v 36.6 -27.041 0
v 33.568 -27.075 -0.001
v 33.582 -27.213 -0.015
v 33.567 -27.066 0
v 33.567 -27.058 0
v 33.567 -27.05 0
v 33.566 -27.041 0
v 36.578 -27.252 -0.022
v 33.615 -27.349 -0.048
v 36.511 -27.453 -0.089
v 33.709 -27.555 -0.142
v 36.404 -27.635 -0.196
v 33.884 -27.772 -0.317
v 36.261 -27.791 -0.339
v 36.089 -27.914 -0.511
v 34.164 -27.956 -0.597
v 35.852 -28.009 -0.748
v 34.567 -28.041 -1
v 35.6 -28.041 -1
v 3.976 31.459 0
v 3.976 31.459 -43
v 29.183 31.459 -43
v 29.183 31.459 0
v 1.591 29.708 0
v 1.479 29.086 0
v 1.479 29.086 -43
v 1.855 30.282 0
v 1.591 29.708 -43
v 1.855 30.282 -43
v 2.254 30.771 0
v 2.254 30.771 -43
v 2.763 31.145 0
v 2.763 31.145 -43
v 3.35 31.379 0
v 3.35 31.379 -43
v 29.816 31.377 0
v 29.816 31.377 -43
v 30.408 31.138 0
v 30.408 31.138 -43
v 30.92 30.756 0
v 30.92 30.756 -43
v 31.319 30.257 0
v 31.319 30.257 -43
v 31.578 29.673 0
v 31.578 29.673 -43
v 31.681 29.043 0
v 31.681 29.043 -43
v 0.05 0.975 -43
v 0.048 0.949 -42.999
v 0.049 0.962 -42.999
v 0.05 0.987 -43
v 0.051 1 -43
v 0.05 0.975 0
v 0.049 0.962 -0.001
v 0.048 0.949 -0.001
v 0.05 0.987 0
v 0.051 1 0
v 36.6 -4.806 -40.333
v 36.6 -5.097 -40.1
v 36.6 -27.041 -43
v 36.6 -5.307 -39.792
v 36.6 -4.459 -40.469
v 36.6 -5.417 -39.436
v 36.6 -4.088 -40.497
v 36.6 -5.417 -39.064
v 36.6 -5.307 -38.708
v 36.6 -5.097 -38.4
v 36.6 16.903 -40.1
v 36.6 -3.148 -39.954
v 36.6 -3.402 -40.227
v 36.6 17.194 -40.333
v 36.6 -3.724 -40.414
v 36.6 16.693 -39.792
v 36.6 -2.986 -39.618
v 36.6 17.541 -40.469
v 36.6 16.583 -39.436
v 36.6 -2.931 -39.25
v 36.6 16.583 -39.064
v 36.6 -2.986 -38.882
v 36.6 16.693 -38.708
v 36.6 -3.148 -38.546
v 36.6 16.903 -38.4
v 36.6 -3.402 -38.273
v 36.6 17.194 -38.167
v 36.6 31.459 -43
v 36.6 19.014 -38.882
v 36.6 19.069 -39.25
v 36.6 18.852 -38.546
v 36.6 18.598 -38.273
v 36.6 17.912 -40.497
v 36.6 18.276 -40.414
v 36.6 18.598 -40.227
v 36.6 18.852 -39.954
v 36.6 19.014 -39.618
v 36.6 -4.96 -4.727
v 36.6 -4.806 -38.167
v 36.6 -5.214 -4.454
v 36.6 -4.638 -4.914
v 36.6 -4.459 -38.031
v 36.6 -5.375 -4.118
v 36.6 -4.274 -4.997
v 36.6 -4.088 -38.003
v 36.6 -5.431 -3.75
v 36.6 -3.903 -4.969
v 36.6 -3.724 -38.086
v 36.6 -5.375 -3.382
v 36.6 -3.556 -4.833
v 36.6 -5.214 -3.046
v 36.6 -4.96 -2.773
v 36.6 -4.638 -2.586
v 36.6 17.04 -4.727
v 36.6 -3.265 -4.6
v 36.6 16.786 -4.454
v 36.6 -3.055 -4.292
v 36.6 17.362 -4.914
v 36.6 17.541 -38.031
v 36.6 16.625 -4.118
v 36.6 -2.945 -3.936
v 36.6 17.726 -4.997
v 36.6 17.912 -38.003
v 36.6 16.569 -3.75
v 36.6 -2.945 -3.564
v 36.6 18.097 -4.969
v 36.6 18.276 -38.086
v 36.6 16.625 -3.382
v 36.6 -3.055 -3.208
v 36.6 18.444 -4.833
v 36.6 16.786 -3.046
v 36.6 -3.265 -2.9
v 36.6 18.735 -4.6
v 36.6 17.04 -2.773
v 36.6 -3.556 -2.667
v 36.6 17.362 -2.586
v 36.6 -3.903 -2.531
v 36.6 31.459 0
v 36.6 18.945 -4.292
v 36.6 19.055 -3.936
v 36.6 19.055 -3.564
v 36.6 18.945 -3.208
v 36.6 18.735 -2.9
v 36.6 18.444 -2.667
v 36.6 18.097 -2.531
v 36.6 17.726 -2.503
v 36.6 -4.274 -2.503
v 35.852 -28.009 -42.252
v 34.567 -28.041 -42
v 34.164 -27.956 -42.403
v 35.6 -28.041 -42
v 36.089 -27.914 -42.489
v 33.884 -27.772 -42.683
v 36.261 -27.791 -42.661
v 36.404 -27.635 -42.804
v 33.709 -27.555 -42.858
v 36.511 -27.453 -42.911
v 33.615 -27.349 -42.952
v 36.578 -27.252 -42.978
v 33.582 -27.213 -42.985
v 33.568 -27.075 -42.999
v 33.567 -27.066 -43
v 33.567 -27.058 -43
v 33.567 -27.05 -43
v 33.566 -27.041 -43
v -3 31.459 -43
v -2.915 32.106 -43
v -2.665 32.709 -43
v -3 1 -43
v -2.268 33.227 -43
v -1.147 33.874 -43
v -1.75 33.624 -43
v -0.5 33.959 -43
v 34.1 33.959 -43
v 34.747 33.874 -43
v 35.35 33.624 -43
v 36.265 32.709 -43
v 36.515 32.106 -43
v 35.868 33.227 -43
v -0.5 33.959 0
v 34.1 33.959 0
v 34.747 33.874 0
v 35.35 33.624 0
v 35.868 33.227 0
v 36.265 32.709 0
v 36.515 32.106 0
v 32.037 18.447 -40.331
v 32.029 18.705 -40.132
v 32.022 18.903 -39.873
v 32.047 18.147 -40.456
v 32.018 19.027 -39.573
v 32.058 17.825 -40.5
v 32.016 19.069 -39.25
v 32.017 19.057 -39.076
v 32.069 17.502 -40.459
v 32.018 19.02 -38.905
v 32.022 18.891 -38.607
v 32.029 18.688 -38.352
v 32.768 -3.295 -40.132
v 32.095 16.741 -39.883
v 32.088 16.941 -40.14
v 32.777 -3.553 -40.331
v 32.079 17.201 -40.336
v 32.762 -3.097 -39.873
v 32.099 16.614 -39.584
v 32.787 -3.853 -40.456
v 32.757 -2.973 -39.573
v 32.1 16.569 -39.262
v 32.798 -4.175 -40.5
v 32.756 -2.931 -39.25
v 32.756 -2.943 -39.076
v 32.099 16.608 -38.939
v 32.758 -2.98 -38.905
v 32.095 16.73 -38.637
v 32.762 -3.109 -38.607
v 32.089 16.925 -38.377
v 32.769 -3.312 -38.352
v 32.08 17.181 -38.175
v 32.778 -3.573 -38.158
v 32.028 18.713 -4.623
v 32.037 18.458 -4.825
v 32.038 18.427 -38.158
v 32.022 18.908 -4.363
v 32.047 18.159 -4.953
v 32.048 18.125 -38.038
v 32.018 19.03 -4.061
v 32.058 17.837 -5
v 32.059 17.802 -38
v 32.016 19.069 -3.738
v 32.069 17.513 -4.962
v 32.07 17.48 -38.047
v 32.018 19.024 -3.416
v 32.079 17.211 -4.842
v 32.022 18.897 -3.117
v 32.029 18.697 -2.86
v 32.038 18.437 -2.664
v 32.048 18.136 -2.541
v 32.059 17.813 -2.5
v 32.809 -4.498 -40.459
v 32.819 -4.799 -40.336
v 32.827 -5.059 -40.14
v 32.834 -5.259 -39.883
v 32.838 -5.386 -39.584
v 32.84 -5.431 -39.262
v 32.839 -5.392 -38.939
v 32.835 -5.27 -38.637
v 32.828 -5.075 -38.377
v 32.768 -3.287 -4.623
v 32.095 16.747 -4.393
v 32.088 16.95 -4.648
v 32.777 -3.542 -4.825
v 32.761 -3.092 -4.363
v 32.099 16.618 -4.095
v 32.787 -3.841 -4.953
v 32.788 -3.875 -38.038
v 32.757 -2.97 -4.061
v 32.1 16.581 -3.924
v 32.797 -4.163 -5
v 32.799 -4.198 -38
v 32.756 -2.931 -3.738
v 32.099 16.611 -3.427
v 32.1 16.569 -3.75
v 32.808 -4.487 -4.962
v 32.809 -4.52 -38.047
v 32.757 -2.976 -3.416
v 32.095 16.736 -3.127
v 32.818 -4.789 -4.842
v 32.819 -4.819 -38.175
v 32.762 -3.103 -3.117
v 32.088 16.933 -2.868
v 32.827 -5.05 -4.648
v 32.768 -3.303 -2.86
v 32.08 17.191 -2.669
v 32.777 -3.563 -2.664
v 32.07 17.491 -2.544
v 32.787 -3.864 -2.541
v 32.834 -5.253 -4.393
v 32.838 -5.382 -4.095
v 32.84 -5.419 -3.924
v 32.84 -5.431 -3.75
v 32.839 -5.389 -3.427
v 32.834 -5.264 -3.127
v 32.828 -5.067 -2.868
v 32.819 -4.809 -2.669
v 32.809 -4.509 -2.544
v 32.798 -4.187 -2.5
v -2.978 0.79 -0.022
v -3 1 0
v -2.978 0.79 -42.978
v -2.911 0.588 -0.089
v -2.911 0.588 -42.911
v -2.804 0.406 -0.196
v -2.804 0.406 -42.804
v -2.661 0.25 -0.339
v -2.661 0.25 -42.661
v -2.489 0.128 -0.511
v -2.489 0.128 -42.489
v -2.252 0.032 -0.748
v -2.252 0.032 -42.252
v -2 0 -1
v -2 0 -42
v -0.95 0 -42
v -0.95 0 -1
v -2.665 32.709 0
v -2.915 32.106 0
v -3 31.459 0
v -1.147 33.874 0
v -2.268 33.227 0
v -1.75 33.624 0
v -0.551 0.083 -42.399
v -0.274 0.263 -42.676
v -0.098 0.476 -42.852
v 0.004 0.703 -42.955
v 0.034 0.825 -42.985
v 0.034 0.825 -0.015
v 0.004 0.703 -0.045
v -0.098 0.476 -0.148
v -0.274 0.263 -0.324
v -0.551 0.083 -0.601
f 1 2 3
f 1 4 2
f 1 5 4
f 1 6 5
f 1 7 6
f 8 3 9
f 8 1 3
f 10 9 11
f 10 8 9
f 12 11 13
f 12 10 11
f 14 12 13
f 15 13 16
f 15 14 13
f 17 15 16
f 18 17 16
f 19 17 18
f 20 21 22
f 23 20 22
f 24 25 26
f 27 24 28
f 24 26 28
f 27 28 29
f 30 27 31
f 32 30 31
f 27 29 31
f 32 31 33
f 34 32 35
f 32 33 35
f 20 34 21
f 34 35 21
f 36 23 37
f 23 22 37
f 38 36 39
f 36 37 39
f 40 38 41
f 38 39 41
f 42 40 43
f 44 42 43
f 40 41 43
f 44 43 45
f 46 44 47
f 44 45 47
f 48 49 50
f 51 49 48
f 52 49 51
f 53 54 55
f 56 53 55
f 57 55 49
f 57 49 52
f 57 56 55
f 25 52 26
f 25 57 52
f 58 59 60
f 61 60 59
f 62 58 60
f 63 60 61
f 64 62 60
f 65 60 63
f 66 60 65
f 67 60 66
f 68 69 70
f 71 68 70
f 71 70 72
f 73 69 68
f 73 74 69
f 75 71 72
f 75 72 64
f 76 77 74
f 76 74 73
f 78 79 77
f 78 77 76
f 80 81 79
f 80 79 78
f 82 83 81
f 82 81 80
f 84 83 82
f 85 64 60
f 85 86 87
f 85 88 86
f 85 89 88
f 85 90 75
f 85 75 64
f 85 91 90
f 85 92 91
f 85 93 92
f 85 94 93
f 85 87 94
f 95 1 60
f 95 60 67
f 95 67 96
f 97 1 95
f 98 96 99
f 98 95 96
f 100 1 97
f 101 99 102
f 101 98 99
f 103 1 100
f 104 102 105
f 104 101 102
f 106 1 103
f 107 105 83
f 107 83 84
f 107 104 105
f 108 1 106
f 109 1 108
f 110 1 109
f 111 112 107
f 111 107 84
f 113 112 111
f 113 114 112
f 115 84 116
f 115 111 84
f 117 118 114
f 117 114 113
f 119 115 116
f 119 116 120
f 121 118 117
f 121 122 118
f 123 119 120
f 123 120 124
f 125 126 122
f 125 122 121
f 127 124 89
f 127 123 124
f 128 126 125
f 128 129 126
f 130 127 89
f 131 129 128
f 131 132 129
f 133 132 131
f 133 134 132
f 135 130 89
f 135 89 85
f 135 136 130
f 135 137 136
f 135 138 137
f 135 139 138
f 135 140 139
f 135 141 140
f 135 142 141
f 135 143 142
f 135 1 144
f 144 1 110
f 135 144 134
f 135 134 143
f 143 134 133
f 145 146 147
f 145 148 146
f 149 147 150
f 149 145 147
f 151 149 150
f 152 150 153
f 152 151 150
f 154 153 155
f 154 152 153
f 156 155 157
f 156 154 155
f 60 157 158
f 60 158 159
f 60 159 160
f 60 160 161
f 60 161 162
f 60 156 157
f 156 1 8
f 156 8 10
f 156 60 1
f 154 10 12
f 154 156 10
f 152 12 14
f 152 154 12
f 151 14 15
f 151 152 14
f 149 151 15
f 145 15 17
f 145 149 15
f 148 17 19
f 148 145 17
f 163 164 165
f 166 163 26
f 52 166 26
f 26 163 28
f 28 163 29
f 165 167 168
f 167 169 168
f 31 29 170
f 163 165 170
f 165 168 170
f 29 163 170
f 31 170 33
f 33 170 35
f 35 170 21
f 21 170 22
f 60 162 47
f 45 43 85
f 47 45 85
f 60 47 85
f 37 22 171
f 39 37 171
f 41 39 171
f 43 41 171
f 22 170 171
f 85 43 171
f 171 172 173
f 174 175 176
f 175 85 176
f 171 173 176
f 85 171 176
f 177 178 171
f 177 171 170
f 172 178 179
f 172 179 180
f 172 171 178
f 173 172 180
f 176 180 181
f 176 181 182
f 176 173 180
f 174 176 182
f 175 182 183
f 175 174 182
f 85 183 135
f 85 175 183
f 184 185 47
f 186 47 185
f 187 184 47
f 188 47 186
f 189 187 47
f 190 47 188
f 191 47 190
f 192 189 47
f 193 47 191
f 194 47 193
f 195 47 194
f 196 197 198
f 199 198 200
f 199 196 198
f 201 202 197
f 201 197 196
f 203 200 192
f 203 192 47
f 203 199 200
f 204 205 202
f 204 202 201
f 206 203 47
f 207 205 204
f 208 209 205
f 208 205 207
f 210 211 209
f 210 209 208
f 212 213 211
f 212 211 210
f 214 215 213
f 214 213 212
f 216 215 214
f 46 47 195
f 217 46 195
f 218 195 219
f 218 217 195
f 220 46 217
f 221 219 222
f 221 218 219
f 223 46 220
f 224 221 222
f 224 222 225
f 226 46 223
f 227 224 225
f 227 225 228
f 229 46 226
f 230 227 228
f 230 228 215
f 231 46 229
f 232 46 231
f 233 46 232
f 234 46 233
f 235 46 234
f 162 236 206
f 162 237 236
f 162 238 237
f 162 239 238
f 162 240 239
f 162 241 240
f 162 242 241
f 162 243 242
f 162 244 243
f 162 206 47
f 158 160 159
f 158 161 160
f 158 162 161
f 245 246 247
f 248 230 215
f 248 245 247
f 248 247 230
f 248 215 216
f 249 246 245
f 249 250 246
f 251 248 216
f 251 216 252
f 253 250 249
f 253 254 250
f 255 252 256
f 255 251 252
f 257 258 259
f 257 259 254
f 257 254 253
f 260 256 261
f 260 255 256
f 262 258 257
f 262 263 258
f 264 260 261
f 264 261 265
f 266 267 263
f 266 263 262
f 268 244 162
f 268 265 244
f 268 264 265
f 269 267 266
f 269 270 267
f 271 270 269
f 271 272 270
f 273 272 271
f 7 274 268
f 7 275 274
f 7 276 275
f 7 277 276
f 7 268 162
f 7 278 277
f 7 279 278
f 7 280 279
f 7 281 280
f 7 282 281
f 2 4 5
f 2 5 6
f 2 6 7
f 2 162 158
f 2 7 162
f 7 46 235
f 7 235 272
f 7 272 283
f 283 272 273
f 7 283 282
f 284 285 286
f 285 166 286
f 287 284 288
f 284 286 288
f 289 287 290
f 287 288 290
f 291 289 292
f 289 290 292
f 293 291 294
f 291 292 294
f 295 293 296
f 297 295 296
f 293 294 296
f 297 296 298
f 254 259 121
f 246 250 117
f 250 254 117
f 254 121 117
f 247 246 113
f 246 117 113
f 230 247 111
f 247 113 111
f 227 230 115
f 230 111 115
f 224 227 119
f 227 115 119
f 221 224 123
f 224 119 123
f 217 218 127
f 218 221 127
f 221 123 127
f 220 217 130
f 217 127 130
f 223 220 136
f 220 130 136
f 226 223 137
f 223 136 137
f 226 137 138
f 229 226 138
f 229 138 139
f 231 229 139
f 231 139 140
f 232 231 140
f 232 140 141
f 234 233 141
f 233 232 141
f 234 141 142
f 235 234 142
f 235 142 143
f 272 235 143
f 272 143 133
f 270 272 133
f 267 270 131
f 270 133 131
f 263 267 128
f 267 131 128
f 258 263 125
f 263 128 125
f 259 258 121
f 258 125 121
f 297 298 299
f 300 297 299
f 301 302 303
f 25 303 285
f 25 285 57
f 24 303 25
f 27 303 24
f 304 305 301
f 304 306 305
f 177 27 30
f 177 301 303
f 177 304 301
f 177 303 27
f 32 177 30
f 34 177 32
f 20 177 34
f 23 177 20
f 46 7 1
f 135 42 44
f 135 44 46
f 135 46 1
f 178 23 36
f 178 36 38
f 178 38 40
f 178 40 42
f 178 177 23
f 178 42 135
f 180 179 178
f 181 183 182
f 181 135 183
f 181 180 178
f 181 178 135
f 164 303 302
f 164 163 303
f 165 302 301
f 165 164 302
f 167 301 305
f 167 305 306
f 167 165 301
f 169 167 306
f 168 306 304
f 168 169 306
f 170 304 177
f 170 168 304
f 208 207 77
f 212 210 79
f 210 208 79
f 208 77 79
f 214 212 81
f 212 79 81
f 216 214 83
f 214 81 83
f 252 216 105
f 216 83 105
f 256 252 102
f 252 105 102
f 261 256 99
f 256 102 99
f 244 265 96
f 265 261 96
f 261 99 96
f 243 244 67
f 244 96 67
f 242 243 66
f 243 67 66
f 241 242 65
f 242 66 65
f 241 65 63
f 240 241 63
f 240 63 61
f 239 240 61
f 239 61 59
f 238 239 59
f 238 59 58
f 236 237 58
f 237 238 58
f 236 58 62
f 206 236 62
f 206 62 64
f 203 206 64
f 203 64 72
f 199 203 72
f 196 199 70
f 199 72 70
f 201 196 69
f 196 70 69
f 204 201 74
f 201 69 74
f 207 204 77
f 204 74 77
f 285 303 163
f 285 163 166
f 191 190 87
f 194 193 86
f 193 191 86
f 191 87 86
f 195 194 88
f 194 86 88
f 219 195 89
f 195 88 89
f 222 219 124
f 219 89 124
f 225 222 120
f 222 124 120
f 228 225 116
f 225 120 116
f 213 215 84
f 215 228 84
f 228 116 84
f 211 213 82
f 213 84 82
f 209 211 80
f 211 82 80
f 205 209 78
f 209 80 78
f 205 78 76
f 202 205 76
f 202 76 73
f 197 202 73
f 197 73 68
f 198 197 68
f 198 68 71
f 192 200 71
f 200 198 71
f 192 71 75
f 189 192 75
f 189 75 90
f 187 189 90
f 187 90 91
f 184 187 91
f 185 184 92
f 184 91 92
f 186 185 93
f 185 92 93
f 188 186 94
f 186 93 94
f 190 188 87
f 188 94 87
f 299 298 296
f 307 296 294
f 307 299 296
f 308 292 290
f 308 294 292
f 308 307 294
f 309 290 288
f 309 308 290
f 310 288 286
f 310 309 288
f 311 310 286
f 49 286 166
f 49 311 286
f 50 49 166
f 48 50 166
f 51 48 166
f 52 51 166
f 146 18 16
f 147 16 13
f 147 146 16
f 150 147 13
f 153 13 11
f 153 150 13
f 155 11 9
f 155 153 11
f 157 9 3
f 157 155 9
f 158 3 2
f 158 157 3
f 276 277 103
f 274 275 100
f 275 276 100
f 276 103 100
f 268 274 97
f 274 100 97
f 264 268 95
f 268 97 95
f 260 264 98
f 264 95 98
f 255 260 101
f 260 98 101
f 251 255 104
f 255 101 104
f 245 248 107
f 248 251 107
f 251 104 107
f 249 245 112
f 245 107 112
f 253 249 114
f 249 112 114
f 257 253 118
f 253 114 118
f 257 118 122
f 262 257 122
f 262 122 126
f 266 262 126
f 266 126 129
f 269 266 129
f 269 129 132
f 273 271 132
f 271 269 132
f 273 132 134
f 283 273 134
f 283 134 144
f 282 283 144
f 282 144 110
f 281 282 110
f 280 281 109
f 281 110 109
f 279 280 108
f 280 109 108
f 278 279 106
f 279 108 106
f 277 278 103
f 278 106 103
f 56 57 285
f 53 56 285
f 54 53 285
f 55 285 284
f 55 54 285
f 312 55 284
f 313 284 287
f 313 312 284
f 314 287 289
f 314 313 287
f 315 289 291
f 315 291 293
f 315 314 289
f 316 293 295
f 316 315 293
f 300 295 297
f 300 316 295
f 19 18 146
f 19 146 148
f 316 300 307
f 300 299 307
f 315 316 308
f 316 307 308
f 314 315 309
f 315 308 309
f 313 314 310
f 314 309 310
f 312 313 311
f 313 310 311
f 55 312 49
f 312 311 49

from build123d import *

# Parameters (mm, degrees)
BOSS_EXTRUDE1_DEPTH = 43
CUT_EXTRUDE1_REACH  = 69.604
SKETCH2_R           = 1.25
FILLET1_R           = 2.5
FILLET2_R           = 2.5
FILLET3_R           = 1
FILLET4_R           = 1


with BuildPart() as part:
    # Sketch1 → Boss-Extrude1 (new body)
    with BuildSketch(Plane.XY):
        Polygon((0, 0), (1.6, 31.458886043), (31.6, 31.458886043), (33.6, -28.041113957), (36.6, -28.041113957), (36.6, 33.958886043), (-3, 33.958886043), (-3, 0), align=None)
    extrude(amount=-BOSS_EXTRUDE1_DEPTH)

    # Cut-Extrude1: up to this plane
    cut_extrude1_end = Plane(origin=(31.6, 31.458886043, -43), z_dir=(-0.9994355464166094, -0.03359447214845748, 0))
    # Sketch2 → Cut-Extrude1 (cut, up to the surface)
    with BuildSketch(Plane(origin=(36.6, 0, 0), x_dir=(0, 0, -1), z_dir=(1, 0, 0)), mode=Mode.PRIVATE) as cut_extrude1_sk1:
        with Locations(Location((39.25, 17.819052722, 0), (0, 0, 90))):
            Circle(SKETCH2_R)
    cut_extrude1_tool1 = split(extrude(cut_extrude1_sk1.sketch, amount=-CUT_EXTRUDE1_REACH, mode=Mode.PRIVATE), bisect_by=cut_extrude1_end, keep=Keep.BOTH, mode=Mode.PRIVATE)
    add(cut_extrude1_tool1.solids().sort_by_distance((36.6, 17.819053, -39.25))[0], mode=Mode.SUBTRACT)
    # Sketch2 → Cut-Extrude1 (cut, up to the surface)
    with BuildSketch(Plane(origin=(36.6, 0, 0), x_dir=(0, 0, -1), z_dir=(1, 0, 0)), mode=Mode.PRIVATE) as cut_extrude1_sk2:
        with Locations(Location((39.25, -4.180947278, 0), (0, 0, 90))):
            Circle(SKETCH2_R)
    cut_extrude1_tool2 = split(extrude(cut_extrude1_sk2.sketch, amount=-CUT_EXTRUDE1_REACH, mode=Mode.PRIVATE), bisect_by=cut_extrude1_end, keep=Keep.BOTH, mode=Mode.PRIVATE)
    add(cut_extrude1_tool2.solids().sort_by_distance((36.6, -4.180947, -39.25))[0], mode=Mode.SUBTRACT)
    # Sketch2 → Cut-Extrude1 (cut, up to the surface)
    with BuildSketch(Plane(origin=(36.6, 0, 0), x_dir=(0, 0, -1), z_dir=(1, 0, 0)), mode=Mode.PRIVATE) as cut_extrude1_sk3:
        with Locations(Location((3.75, -4.180947278, 0), (0, 0, 270))):
            Circle(SKETCH2_R)
    cut_extrude1_tool3 = split(extrude(cut_extrude1_sk3.sketch, amount=-CUT_EXTRUDE1_REACH, mode=Mode.PRIVATE), bisect_by=cut_extrude1_end, keep=Keep.BOTH, mode=Mode.PRIVATE)
    add(cut_extrude1_tool3.solids().sort_by_distance((36.6, -4.180947, -3.75))[0], mode=Mode.SUBTRACT)
    # Sketch2 → Cut-Extrude1 (cut, up to the surface)
    with BuildSketch(Plane(origin=(36.6, 0, 0), x_dir=(0, 0, -1), z_dir=(1, 0, 0)), mode=Mode.PRIVATE) as cut_extrude1_sk4:
        with Locations(Location((3.75, 17.819052722, 0), (0, 0, 270))):
            Circle(SKETCH2_R)
    cut_extrude1_tool4 = split(extrude(cut_extrude1_sk4.sketch, amount=-CUT_EXTRUDE1_REACH, mode=Mode.PRIVATE), bisect_by=cut_extrude1_end, keep=Keep.BOTH, mode=Mode.PRIVATE)
    add(cut_extrude1_tool4.solids().sort_by_distance((36.6, 17.819053, -3.75))[0], mode=Mode.SUBTRACT)

    # Fillet1
    fillet1_edges = [part.edges().sort_by_distance(p)[0] for p in [
        (31.6, 31.458886043, -21.5),
        (1.6, 31.458886043, -21.5),
    ]]
    fillet(fillet1_edges, radius=FILLET1_R)

    # Fillet2
    fillet2_edges = [part.edges().sort_by_distance(p)[0] for p in [
        (-3, 33.958886043, -21.5),
        (36.6, 33.958886043, -21.5),
    ]]
    fillet(fillet2_edges, radius=FILLET2_R)

    # Fillet3
    fillet3_edges = [part.edges().sort_by_distance(p)[0] for p in [
        (-1.5, 0, 0),
        (-3, 0, -21.5),
        (0, 0, -21.5),
        (-1.5, 0, -43),
    ]]
    fillet(fillet3_edges, radius=FILLET3_R)

    # Fillet4
    fillet4_edges = [part.edges().sort_by_distance(p)[0] for p in [
        (36.6, -28.041113957, -21.5),
        (33.6, -28.041113957, -21.5),
        (35.1, -28.041113957, -43),
        (35.1, -28.041113957, 0),
    ]]
    fillet(fillet4_edges, radius=FILLET4_R)


solid = part.part
